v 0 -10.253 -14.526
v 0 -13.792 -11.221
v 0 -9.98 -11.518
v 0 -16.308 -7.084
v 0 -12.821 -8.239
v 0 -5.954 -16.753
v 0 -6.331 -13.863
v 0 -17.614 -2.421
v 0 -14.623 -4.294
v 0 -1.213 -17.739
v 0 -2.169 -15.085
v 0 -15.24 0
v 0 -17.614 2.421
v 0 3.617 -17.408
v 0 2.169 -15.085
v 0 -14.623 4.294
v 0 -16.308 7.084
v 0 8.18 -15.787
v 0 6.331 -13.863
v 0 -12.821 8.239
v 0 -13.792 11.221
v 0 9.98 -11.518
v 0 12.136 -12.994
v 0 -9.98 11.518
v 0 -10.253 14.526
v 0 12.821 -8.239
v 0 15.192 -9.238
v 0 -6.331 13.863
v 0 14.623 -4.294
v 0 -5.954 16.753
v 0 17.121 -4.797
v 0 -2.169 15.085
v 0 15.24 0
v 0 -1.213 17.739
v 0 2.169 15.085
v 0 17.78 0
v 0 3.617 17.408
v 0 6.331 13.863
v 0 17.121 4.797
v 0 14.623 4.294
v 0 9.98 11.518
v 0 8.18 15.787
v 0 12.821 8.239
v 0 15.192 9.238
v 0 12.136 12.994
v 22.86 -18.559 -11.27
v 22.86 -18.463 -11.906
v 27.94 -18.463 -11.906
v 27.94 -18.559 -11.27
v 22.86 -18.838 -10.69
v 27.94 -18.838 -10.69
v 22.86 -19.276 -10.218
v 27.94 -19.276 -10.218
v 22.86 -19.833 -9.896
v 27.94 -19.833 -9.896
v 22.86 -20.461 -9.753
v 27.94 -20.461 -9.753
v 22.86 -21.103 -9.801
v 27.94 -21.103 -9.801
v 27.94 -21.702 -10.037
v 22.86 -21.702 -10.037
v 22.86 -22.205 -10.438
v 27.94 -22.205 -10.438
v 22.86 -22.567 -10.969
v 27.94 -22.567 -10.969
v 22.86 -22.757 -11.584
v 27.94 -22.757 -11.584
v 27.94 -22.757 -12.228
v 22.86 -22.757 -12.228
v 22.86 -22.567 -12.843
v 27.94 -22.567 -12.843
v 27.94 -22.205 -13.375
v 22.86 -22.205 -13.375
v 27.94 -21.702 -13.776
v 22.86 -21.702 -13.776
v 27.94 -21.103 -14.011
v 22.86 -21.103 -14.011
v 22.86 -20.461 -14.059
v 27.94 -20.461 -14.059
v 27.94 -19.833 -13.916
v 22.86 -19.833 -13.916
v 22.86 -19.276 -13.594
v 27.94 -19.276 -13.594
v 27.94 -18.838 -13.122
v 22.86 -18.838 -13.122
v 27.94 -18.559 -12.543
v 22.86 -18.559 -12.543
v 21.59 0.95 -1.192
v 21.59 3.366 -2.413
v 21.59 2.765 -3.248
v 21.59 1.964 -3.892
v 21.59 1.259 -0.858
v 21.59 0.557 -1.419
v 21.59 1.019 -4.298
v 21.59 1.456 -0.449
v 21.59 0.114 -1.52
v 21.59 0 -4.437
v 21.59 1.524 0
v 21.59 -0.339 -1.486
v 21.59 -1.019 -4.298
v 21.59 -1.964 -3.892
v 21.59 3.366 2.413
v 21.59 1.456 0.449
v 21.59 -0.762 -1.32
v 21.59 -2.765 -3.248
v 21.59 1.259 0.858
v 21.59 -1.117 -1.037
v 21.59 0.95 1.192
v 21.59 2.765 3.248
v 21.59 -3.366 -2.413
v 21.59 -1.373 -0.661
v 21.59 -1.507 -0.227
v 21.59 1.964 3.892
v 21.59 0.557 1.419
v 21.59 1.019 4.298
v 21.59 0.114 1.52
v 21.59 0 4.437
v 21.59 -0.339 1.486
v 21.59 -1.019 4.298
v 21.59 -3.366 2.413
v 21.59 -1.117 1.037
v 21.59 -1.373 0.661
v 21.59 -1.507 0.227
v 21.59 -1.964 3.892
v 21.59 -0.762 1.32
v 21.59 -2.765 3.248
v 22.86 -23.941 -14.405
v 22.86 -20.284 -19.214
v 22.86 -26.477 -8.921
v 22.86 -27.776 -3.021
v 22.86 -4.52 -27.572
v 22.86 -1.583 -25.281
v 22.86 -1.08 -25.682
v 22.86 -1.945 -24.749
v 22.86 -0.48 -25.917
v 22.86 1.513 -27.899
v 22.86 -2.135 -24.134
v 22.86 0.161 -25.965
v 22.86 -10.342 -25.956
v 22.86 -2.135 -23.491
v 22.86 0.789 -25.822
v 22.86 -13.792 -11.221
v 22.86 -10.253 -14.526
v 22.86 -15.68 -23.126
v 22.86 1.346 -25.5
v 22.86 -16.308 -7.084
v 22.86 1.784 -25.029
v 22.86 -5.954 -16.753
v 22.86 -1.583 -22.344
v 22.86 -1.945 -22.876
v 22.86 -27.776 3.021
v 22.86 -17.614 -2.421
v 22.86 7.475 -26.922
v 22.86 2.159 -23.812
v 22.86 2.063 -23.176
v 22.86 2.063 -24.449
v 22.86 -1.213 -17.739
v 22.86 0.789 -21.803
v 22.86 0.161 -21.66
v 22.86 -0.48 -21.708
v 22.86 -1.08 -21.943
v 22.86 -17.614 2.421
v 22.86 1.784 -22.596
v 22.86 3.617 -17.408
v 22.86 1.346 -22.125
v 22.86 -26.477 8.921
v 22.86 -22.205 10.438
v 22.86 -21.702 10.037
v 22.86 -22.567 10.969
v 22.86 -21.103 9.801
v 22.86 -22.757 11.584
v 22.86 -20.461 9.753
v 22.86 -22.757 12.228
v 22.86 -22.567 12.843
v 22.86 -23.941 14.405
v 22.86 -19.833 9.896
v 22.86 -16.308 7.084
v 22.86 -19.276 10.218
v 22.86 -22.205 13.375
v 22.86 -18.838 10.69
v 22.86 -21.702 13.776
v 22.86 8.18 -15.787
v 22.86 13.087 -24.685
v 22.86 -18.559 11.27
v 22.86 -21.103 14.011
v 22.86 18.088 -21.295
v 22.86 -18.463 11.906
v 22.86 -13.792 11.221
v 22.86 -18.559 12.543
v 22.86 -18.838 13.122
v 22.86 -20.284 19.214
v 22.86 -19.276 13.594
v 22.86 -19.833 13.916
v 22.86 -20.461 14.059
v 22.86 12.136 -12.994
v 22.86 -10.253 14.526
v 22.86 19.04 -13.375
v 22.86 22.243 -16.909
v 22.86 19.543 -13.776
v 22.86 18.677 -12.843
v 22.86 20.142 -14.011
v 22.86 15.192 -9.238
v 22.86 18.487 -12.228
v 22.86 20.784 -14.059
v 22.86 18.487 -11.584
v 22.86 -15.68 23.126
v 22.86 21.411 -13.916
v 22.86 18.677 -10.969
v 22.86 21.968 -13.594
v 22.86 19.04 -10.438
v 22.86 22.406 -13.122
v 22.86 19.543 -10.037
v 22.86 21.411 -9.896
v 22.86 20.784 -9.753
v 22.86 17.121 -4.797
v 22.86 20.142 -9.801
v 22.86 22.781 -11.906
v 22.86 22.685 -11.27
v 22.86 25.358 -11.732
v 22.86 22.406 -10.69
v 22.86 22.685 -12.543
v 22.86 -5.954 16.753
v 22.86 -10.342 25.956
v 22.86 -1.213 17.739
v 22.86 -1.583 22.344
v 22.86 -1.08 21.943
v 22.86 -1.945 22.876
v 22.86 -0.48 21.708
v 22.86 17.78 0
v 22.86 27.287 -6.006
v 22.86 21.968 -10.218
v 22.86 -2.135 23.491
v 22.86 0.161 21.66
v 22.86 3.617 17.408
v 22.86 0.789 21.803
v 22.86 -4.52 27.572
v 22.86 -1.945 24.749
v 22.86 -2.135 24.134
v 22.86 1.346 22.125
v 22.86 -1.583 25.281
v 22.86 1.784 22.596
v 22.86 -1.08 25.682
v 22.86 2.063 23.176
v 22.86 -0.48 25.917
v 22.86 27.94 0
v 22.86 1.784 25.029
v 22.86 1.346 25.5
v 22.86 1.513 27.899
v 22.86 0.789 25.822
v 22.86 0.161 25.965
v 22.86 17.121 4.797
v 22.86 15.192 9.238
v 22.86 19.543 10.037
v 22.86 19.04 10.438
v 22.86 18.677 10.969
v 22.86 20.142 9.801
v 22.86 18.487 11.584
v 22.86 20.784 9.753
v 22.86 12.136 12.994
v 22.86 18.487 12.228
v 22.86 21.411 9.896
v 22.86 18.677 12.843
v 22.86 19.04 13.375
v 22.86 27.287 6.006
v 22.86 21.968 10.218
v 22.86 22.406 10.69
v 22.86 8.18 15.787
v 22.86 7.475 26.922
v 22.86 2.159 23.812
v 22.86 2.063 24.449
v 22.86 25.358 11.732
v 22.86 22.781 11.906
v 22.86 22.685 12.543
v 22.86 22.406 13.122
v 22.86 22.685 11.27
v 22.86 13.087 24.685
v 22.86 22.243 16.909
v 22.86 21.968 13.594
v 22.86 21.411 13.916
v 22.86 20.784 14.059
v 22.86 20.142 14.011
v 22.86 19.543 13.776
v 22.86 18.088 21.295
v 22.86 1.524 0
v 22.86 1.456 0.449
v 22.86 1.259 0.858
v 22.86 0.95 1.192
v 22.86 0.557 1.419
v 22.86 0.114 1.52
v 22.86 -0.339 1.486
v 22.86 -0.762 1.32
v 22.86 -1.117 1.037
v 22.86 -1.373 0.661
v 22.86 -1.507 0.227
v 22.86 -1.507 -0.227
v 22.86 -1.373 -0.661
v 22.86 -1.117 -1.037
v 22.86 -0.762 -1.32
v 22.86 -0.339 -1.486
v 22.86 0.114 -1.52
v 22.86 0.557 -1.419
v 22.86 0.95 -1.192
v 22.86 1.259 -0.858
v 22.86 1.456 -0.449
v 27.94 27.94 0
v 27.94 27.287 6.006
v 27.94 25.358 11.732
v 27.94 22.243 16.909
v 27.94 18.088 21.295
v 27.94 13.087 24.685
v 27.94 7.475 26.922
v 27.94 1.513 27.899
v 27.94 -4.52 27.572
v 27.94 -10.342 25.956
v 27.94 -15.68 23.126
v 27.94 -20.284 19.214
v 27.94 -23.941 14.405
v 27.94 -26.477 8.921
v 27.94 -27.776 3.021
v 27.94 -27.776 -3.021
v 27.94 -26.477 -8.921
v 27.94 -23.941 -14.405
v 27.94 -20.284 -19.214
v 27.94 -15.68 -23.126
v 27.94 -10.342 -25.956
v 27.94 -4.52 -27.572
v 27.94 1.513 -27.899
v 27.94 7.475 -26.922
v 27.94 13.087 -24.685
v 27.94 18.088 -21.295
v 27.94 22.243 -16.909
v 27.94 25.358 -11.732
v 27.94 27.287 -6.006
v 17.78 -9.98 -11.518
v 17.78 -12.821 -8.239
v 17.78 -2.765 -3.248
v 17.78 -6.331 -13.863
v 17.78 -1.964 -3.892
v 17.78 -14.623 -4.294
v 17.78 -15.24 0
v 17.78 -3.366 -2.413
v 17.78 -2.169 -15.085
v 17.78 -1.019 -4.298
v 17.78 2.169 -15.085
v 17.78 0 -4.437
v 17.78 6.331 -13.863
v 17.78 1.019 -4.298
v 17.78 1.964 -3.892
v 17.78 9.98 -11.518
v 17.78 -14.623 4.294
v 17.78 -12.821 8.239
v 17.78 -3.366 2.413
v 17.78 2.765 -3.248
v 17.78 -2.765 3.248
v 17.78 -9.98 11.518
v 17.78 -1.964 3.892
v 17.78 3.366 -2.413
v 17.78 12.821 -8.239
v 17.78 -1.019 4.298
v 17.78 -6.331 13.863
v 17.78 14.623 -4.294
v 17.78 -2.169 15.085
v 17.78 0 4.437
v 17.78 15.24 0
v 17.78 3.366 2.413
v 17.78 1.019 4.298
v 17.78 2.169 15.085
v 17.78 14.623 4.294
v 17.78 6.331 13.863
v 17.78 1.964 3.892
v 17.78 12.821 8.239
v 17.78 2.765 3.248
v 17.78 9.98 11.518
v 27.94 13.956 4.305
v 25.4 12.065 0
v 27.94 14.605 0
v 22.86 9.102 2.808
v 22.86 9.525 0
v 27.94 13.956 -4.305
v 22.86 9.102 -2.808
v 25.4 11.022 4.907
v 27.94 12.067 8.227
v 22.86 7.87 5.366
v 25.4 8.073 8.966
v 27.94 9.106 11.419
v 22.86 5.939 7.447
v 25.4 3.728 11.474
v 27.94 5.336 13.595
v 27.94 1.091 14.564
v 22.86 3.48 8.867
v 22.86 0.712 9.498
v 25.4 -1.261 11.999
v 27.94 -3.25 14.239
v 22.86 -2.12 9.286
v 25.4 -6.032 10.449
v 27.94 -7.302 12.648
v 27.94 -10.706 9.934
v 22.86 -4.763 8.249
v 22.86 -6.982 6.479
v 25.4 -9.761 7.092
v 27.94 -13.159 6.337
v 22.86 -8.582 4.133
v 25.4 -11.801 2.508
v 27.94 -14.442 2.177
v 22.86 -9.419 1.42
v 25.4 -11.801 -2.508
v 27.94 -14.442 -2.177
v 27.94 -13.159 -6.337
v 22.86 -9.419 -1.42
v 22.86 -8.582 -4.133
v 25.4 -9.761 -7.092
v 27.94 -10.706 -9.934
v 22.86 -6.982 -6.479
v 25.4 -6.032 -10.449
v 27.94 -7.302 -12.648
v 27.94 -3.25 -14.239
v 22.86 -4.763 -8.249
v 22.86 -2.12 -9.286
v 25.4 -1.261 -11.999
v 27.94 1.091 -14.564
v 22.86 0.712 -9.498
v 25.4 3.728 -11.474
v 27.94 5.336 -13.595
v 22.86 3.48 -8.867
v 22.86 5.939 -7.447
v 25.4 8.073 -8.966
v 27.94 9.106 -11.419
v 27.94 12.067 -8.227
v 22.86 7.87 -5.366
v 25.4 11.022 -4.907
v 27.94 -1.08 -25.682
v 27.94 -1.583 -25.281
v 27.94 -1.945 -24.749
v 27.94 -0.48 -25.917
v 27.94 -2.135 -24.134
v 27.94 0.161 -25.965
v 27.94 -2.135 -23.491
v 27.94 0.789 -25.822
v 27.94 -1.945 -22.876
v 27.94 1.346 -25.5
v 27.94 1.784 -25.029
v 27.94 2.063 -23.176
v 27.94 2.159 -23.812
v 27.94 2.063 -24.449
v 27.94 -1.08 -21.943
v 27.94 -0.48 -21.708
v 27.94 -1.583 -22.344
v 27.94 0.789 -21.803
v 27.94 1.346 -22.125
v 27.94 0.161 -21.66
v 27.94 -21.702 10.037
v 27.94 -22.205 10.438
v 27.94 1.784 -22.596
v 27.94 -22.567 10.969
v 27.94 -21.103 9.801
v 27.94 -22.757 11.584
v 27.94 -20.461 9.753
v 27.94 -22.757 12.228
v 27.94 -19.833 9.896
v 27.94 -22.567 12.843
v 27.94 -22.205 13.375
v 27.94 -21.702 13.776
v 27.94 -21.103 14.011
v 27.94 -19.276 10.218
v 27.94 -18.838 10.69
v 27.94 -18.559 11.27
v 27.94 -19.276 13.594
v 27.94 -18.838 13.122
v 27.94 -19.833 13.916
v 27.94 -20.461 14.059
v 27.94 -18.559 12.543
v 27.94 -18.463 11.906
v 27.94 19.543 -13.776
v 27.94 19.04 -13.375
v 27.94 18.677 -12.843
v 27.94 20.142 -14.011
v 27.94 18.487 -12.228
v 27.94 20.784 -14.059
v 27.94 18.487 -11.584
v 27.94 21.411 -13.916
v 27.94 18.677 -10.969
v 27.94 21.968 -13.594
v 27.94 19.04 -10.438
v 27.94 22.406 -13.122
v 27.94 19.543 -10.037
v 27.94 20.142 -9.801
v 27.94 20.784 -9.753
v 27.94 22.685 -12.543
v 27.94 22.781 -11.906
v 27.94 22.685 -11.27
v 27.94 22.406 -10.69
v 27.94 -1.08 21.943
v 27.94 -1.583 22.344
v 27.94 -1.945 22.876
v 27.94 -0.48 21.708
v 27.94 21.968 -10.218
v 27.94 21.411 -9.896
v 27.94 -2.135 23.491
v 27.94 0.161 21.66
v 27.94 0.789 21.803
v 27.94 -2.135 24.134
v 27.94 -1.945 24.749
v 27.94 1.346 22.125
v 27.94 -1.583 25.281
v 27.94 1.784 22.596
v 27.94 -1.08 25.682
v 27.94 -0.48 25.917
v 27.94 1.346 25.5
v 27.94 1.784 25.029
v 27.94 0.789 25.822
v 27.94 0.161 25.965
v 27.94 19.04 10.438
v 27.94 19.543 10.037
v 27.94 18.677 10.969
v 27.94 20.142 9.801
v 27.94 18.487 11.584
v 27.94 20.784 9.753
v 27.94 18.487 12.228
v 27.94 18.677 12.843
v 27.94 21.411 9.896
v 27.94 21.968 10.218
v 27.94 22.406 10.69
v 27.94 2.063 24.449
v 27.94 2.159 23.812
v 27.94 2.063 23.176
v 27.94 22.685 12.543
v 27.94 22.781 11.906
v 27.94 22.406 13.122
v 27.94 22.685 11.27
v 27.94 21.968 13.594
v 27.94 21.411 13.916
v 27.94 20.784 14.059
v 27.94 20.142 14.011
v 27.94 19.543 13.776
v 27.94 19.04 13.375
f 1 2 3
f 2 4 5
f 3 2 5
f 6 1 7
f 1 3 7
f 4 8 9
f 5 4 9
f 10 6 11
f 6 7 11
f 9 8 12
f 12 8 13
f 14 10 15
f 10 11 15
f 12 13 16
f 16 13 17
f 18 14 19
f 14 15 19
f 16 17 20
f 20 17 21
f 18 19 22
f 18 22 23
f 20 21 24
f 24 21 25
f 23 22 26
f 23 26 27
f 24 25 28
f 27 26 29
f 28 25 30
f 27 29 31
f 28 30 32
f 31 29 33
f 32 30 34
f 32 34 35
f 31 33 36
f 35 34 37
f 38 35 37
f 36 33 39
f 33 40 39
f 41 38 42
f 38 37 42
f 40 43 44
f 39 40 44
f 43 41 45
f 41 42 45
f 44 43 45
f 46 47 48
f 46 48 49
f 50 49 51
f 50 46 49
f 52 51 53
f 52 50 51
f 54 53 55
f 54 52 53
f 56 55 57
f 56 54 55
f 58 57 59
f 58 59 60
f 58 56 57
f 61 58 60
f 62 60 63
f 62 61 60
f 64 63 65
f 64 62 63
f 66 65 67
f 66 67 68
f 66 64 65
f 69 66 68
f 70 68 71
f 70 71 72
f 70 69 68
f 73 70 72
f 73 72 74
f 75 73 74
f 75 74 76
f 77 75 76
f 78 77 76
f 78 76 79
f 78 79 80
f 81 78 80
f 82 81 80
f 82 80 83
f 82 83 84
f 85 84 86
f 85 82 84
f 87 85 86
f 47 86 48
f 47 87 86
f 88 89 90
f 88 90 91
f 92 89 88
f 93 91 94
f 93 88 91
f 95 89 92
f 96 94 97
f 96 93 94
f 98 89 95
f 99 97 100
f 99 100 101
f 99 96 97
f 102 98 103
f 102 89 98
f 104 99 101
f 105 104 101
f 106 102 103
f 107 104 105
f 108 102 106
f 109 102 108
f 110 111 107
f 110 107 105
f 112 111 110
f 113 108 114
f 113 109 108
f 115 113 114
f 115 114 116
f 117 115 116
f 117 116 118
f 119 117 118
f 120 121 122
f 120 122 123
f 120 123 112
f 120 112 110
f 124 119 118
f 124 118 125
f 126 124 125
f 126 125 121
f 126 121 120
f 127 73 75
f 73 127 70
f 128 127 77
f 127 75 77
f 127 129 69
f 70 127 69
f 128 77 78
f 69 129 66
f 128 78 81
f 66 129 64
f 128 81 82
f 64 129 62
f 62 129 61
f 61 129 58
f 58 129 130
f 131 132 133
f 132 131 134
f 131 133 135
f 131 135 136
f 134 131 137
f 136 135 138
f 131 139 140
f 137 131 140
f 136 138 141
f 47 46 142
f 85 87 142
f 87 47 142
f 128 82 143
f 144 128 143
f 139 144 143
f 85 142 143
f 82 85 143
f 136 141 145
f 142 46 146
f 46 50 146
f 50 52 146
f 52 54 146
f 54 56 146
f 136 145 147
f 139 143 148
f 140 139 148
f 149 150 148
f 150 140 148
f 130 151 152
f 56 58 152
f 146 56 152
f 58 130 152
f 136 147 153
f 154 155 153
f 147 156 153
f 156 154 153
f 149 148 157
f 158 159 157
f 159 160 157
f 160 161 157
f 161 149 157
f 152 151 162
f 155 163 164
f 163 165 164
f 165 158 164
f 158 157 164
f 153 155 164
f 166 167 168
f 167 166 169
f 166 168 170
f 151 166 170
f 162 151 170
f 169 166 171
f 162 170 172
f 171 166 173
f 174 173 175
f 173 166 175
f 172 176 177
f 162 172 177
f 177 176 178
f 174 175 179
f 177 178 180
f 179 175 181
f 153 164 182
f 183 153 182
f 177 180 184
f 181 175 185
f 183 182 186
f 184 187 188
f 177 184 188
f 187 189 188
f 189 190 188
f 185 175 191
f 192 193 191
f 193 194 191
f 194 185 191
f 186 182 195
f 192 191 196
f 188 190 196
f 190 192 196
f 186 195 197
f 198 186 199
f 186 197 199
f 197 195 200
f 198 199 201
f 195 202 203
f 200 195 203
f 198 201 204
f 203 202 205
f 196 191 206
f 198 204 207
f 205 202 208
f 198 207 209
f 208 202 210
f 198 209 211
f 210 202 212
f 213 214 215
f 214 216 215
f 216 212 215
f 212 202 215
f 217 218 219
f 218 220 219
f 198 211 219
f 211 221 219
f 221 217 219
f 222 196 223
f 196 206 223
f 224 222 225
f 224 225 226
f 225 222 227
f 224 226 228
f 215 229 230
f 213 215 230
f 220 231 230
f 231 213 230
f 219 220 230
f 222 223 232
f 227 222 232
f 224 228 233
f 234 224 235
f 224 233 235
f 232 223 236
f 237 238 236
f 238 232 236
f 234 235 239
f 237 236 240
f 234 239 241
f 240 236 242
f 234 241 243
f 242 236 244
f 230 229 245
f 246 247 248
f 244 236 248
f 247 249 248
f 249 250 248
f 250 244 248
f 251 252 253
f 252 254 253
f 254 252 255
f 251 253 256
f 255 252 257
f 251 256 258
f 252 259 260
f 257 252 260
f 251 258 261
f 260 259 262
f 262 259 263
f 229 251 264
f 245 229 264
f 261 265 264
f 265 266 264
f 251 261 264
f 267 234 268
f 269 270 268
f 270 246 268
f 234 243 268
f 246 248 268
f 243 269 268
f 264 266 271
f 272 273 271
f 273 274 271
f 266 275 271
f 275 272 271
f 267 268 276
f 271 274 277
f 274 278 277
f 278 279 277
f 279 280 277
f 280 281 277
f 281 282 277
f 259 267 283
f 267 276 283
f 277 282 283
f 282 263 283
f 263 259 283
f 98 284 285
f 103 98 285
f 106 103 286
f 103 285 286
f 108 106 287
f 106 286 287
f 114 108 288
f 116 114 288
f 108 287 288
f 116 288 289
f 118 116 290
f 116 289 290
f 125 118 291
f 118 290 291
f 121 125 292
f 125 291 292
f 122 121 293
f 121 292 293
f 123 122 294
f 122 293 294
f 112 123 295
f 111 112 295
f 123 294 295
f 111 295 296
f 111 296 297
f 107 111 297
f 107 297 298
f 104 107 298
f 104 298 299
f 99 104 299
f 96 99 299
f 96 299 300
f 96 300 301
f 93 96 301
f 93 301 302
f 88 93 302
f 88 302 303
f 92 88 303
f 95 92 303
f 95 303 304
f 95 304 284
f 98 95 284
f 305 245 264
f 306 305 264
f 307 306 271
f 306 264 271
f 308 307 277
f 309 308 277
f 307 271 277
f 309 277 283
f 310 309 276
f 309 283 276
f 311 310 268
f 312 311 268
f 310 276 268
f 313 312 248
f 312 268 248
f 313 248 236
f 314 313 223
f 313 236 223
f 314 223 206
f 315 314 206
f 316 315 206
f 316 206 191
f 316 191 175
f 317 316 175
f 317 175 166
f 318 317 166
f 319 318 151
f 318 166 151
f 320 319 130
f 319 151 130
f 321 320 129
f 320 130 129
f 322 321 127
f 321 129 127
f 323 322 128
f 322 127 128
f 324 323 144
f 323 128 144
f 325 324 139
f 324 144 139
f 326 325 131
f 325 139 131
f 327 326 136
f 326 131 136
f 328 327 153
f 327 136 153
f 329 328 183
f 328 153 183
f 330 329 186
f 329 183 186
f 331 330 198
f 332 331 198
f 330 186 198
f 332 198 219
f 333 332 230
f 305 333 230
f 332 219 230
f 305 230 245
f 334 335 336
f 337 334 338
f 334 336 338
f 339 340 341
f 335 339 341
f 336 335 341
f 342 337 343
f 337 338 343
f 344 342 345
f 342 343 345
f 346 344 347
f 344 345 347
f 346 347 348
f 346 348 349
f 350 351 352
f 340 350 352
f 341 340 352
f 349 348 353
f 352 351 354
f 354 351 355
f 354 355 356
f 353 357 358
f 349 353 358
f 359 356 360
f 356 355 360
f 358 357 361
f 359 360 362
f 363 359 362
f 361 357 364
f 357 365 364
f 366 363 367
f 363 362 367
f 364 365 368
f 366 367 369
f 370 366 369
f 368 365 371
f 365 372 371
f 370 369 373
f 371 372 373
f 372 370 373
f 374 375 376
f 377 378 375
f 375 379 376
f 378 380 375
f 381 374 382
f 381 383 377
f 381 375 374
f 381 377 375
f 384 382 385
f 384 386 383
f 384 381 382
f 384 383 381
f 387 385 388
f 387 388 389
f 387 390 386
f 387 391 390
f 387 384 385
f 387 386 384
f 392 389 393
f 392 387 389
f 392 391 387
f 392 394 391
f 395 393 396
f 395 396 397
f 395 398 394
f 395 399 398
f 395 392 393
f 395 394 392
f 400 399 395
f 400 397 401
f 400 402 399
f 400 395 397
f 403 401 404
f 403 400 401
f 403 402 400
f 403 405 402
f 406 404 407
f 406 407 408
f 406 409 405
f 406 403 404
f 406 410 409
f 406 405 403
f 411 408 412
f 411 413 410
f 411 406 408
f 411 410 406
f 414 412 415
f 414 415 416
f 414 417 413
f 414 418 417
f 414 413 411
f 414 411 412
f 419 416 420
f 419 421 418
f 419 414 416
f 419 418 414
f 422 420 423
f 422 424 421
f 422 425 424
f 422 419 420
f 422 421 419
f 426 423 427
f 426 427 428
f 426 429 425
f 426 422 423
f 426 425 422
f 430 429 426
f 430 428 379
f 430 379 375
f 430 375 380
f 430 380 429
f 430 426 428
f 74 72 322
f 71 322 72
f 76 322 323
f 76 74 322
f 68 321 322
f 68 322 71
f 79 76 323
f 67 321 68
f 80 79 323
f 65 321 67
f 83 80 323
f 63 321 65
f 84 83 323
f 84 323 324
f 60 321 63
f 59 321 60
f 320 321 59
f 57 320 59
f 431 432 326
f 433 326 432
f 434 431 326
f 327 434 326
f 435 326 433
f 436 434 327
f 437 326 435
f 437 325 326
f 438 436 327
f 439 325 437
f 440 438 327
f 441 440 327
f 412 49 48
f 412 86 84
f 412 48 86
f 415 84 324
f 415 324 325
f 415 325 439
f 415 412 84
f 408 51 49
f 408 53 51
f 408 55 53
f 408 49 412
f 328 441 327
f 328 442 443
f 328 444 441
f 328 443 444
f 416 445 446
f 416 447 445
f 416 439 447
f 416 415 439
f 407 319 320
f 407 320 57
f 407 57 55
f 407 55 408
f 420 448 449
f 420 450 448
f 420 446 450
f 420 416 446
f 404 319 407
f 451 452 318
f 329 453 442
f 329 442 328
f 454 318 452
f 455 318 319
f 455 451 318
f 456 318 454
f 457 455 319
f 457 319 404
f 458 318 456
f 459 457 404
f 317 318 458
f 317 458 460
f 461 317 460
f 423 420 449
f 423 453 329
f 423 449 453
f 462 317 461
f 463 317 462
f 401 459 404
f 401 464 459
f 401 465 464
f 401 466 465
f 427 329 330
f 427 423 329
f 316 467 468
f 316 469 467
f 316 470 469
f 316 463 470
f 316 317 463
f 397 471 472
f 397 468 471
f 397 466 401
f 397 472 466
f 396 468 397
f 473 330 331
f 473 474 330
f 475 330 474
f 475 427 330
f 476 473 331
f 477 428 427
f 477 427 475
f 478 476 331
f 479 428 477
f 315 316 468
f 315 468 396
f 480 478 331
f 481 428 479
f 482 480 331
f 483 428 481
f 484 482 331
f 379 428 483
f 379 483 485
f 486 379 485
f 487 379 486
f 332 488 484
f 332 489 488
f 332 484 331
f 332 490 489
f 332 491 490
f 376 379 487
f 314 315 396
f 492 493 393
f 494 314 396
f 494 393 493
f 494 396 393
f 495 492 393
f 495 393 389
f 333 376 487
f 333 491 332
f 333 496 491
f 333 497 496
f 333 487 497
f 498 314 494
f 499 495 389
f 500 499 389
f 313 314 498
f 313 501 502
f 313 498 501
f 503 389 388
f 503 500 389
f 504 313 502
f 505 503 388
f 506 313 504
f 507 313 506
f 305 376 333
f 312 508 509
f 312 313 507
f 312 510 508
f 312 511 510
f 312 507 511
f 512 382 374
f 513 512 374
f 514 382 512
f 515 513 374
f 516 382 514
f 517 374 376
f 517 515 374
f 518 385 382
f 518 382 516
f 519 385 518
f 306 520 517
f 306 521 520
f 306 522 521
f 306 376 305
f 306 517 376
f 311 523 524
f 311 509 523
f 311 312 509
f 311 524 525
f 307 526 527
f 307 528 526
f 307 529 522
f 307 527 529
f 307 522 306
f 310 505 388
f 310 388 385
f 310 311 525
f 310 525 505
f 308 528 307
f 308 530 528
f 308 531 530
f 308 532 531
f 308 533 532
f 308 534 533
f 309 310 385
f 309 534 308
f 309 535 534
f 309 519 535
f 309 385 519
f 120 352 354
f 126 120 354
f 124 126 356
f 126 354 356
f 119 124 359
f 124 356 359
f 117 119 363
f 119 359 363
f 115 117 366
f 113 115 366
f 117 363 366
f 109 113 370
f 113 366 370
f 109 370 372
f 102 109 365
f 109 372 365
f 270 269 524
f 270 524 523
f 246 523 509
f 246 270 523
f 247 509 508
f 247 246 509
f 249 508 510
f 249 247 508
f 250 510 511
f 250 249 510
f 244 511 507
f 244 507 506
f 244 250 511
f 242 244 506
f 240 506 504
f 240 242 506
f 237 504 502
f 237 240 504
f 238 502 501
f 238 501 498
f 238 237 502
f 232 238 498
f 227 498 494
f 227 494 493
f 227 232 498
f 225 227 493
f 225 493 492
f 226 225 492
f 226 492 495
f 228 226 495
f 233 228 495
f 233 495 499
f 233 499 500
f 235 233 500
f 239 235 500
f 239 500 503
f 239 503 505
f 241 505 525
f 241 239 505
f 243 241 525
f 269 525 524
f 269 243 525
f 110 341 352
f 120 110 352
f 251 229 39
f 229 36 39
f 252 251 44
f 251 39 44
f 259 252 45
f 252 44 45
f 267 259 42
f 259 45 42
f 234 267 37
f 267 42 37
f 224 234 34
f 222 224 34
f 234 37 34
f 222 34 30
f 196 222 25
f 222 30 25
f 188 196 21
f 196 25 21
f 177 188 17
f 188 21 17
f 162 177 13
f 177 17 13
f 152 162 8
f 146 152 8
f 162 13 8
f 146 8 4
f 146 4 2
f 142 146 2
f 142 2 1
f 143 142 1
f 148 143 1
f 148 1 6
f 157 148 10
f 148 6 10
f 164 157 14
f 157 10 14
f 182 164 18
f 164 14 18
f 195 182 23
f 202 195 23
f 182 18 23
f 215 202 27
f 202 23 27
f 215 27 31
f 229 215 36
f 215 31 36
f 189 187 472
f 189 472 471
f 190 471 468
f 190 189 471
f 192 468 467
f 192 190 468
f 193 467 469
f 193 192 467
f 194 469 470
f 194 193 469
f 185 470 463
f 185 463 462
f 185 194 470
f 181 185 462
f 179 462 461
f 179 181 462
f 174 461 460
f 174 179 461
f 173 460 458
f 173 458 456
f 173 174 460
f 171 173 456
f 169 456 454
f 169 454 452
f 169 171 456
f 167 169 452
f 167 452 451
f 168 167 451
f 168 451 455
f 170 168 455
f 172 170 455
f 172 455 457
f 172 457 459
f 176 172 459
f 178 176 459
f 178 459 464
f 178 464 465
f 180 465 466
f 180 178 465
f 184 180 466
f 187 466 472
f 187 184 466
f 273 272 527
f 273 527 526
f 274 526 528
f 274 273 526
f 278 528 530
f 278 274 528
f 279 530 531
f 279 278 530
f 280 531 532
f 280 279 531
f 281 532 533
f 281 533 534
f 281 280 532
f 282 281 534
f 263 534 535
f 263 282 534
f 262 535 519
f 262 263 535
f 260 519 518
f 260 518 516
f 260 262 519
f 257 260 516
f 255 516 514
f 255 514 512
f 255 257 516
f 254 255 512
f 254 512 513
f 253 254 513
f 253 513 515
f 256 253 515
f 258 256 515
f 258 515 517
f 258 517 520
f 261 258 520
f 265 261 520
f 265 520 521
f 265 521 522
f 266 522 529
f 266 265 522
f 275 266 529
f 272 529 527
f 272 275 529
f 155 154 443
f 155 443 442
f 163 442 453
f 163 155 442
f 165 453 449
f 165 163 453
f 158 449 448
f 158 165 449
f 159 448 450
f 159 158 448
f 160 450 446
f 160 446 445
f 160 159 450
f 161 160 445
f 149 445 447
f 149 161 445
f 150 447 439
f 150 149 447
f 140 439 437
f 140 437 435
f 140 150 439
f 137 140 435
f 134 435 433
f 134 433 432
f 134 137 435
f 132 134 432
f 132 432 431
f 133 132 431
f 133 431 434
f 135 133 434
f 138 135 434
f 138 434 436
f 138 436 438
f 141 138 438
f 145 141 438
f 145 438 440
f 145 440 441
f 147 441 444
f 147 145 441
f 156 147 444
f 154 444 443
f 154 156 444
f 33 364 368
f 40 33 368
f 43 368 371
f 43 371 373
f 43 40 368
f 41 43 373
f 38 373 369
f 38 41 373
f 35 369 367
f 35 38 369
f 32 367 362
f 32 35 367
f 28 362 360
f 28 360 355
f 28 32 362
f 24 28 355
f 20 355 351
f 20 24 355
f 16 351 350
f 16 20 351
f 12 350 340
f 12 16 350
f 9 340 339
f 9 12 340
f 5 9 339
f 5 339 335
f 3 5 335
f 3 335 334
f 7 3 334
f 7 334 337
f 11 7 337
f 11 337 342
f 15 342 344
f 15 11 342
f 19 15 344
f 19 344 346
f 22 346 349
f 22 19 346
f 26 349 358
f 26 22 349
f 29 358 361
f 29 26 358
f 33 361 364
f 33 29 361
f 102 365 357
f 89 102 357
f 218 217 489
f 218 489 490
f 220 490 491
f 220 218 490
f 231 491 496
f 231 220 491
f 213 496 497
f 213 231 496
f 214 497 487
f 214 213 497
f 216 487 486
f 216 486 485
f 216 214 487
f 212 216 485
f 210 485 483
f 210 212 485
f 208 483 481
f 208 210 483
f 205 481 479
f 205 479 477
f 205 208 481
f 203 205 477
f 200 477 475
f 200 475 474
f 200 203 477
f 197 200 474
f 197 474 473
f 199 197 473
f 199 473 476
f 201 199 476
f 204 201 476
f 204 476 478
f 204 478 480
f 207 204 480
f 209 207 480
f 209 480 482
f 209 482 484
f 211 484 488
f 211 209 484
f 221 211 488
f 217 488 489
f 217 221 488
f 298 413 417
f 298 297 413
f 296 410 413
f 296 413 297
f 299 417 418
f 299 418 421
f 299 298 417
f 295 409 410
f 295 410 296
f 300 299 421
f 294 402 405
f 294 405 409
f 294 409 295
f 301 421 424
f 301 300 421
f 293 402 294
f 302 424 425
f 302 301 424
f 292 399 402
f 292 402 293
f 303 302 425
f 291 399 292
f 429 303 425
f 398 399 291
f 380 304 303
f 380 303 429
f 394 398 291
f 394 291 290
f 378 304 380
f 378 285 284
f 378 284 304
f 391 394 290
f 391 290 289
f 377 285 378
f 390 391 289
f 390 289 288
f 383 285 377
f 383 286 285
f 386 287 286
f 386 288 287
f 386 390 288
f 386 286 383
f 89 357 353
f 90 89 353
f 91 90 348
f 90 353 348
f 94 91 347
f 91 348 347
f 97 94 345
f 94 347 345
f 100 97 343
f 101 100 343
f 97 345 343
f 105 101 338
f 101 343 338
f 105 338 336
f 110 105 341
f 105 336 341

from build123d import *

# Parameters (mm, degrees)
F0_R      = 17.78
F0_R_2    = 15.24
F1_DEPTH  = 17.78
F2_R      = 17.78
F3_DEPTH  = 5.08
F4_R      = 1.524
F5_DEPTH  = 25.4
F6_R      = 27.94
F6_R_2    = 2.159
F6_R_3    = 9.525
F7_DEPTH  = 5.08
F8_SIZE   = 5.07999
F10_DEPTH = 3.81


# Not quite as in the source:
# - a fillet or chamfer is up to 0.001 mm smaller than in the source, because OpenCascade refuses the exact size


with BuildPart() as f1:
    # F0 (on Right) → F1 (new body)
    with BuildSketch(Plane.YZ):
        Circle(F0_R)
        Circle(F0_R_2, mode=Mode.SUBTRACT)
    extrude(amount=F1_DEPTH)

    # F2 (on face) → F3 (join)
    with BuildSketch(Plane.YZ.offset(17.78)):
        Circle(F2_R)
    extrude(amount=F3_DEPTH)

    # F4 (on face) → F5 (cut)
    with BuildSketch(Plane.YZ.offset(22.86)):
        Circle(F4_R)
    extrude(amount=-F5_DEPTH, mode=Mode.SUBTRACT)

    # F6 (on face) → F7 (join)
    with BuildSketch(Plane.YZ.offset(22.86)):
        Circle(F6_R)
        with Locations((0, -23.8125)):
            Circle(F6_R_2, mode=Mode.SUBTRACT)
        with Locations((-20.6222299276, -11.90625)):
            Circle(F6_R_2, mode=Mode.SUBTRACT)
        Circle(F6_R_3, mode=Mode.SUBTRACT)
        with Locations((20.6222299276, -11.90625)):
            Circle(F6_R_2, mode=Mode.SUBTRACT)
        with Locations((-20.6222299276, 11.90625)):
            Circle(F6_R_2, mode=Mode.SUBTRACT)
        with Locations((0, 23.8125)):
            Circle(F6_R_2, mode=Mode.SUBTRACT)
        with Locations((20.6222299276, 11.90625)):
            Circle(F6_R_2, mode=Mode.SUBTRACT)
    extrude(amount=F7_DEPTH)

    # F8 (size 5.08 in the source; OpenCascade refuses exactly that, so slightly less here)
    f8_edges = [f1.edges().sort_by_distance(p)[0] for p in [
        (27.94, -9.525, 0),
    ]]
    chamfer(f8_edges, length=F8_SIZE)

    # F9 (on face) → F10 (cut)
    with BuildSketch(Plane(origin=(17.78, 0, 0), x_dir=(0, -1, 0), z_dir=(-1, 0, 0))):
        with BuildLine():
            ThreePointArc((3.3655, 2.413), (0, 4.437080139), (-3.3655, 2.413))
            Line((-3.3655, 2.413), (-3.3655, -2.413))
            ThreePointArc((-3.3655, -2.413), (0, -4.437080139), (3.3655, -2.413))
            Line((3.3655, -2.413), (3.3655, 2.413))
        make_face()
    extrude(amount=-F10_DEPTH, mode=Mode.SUBTRACT)


solid = f1.part
